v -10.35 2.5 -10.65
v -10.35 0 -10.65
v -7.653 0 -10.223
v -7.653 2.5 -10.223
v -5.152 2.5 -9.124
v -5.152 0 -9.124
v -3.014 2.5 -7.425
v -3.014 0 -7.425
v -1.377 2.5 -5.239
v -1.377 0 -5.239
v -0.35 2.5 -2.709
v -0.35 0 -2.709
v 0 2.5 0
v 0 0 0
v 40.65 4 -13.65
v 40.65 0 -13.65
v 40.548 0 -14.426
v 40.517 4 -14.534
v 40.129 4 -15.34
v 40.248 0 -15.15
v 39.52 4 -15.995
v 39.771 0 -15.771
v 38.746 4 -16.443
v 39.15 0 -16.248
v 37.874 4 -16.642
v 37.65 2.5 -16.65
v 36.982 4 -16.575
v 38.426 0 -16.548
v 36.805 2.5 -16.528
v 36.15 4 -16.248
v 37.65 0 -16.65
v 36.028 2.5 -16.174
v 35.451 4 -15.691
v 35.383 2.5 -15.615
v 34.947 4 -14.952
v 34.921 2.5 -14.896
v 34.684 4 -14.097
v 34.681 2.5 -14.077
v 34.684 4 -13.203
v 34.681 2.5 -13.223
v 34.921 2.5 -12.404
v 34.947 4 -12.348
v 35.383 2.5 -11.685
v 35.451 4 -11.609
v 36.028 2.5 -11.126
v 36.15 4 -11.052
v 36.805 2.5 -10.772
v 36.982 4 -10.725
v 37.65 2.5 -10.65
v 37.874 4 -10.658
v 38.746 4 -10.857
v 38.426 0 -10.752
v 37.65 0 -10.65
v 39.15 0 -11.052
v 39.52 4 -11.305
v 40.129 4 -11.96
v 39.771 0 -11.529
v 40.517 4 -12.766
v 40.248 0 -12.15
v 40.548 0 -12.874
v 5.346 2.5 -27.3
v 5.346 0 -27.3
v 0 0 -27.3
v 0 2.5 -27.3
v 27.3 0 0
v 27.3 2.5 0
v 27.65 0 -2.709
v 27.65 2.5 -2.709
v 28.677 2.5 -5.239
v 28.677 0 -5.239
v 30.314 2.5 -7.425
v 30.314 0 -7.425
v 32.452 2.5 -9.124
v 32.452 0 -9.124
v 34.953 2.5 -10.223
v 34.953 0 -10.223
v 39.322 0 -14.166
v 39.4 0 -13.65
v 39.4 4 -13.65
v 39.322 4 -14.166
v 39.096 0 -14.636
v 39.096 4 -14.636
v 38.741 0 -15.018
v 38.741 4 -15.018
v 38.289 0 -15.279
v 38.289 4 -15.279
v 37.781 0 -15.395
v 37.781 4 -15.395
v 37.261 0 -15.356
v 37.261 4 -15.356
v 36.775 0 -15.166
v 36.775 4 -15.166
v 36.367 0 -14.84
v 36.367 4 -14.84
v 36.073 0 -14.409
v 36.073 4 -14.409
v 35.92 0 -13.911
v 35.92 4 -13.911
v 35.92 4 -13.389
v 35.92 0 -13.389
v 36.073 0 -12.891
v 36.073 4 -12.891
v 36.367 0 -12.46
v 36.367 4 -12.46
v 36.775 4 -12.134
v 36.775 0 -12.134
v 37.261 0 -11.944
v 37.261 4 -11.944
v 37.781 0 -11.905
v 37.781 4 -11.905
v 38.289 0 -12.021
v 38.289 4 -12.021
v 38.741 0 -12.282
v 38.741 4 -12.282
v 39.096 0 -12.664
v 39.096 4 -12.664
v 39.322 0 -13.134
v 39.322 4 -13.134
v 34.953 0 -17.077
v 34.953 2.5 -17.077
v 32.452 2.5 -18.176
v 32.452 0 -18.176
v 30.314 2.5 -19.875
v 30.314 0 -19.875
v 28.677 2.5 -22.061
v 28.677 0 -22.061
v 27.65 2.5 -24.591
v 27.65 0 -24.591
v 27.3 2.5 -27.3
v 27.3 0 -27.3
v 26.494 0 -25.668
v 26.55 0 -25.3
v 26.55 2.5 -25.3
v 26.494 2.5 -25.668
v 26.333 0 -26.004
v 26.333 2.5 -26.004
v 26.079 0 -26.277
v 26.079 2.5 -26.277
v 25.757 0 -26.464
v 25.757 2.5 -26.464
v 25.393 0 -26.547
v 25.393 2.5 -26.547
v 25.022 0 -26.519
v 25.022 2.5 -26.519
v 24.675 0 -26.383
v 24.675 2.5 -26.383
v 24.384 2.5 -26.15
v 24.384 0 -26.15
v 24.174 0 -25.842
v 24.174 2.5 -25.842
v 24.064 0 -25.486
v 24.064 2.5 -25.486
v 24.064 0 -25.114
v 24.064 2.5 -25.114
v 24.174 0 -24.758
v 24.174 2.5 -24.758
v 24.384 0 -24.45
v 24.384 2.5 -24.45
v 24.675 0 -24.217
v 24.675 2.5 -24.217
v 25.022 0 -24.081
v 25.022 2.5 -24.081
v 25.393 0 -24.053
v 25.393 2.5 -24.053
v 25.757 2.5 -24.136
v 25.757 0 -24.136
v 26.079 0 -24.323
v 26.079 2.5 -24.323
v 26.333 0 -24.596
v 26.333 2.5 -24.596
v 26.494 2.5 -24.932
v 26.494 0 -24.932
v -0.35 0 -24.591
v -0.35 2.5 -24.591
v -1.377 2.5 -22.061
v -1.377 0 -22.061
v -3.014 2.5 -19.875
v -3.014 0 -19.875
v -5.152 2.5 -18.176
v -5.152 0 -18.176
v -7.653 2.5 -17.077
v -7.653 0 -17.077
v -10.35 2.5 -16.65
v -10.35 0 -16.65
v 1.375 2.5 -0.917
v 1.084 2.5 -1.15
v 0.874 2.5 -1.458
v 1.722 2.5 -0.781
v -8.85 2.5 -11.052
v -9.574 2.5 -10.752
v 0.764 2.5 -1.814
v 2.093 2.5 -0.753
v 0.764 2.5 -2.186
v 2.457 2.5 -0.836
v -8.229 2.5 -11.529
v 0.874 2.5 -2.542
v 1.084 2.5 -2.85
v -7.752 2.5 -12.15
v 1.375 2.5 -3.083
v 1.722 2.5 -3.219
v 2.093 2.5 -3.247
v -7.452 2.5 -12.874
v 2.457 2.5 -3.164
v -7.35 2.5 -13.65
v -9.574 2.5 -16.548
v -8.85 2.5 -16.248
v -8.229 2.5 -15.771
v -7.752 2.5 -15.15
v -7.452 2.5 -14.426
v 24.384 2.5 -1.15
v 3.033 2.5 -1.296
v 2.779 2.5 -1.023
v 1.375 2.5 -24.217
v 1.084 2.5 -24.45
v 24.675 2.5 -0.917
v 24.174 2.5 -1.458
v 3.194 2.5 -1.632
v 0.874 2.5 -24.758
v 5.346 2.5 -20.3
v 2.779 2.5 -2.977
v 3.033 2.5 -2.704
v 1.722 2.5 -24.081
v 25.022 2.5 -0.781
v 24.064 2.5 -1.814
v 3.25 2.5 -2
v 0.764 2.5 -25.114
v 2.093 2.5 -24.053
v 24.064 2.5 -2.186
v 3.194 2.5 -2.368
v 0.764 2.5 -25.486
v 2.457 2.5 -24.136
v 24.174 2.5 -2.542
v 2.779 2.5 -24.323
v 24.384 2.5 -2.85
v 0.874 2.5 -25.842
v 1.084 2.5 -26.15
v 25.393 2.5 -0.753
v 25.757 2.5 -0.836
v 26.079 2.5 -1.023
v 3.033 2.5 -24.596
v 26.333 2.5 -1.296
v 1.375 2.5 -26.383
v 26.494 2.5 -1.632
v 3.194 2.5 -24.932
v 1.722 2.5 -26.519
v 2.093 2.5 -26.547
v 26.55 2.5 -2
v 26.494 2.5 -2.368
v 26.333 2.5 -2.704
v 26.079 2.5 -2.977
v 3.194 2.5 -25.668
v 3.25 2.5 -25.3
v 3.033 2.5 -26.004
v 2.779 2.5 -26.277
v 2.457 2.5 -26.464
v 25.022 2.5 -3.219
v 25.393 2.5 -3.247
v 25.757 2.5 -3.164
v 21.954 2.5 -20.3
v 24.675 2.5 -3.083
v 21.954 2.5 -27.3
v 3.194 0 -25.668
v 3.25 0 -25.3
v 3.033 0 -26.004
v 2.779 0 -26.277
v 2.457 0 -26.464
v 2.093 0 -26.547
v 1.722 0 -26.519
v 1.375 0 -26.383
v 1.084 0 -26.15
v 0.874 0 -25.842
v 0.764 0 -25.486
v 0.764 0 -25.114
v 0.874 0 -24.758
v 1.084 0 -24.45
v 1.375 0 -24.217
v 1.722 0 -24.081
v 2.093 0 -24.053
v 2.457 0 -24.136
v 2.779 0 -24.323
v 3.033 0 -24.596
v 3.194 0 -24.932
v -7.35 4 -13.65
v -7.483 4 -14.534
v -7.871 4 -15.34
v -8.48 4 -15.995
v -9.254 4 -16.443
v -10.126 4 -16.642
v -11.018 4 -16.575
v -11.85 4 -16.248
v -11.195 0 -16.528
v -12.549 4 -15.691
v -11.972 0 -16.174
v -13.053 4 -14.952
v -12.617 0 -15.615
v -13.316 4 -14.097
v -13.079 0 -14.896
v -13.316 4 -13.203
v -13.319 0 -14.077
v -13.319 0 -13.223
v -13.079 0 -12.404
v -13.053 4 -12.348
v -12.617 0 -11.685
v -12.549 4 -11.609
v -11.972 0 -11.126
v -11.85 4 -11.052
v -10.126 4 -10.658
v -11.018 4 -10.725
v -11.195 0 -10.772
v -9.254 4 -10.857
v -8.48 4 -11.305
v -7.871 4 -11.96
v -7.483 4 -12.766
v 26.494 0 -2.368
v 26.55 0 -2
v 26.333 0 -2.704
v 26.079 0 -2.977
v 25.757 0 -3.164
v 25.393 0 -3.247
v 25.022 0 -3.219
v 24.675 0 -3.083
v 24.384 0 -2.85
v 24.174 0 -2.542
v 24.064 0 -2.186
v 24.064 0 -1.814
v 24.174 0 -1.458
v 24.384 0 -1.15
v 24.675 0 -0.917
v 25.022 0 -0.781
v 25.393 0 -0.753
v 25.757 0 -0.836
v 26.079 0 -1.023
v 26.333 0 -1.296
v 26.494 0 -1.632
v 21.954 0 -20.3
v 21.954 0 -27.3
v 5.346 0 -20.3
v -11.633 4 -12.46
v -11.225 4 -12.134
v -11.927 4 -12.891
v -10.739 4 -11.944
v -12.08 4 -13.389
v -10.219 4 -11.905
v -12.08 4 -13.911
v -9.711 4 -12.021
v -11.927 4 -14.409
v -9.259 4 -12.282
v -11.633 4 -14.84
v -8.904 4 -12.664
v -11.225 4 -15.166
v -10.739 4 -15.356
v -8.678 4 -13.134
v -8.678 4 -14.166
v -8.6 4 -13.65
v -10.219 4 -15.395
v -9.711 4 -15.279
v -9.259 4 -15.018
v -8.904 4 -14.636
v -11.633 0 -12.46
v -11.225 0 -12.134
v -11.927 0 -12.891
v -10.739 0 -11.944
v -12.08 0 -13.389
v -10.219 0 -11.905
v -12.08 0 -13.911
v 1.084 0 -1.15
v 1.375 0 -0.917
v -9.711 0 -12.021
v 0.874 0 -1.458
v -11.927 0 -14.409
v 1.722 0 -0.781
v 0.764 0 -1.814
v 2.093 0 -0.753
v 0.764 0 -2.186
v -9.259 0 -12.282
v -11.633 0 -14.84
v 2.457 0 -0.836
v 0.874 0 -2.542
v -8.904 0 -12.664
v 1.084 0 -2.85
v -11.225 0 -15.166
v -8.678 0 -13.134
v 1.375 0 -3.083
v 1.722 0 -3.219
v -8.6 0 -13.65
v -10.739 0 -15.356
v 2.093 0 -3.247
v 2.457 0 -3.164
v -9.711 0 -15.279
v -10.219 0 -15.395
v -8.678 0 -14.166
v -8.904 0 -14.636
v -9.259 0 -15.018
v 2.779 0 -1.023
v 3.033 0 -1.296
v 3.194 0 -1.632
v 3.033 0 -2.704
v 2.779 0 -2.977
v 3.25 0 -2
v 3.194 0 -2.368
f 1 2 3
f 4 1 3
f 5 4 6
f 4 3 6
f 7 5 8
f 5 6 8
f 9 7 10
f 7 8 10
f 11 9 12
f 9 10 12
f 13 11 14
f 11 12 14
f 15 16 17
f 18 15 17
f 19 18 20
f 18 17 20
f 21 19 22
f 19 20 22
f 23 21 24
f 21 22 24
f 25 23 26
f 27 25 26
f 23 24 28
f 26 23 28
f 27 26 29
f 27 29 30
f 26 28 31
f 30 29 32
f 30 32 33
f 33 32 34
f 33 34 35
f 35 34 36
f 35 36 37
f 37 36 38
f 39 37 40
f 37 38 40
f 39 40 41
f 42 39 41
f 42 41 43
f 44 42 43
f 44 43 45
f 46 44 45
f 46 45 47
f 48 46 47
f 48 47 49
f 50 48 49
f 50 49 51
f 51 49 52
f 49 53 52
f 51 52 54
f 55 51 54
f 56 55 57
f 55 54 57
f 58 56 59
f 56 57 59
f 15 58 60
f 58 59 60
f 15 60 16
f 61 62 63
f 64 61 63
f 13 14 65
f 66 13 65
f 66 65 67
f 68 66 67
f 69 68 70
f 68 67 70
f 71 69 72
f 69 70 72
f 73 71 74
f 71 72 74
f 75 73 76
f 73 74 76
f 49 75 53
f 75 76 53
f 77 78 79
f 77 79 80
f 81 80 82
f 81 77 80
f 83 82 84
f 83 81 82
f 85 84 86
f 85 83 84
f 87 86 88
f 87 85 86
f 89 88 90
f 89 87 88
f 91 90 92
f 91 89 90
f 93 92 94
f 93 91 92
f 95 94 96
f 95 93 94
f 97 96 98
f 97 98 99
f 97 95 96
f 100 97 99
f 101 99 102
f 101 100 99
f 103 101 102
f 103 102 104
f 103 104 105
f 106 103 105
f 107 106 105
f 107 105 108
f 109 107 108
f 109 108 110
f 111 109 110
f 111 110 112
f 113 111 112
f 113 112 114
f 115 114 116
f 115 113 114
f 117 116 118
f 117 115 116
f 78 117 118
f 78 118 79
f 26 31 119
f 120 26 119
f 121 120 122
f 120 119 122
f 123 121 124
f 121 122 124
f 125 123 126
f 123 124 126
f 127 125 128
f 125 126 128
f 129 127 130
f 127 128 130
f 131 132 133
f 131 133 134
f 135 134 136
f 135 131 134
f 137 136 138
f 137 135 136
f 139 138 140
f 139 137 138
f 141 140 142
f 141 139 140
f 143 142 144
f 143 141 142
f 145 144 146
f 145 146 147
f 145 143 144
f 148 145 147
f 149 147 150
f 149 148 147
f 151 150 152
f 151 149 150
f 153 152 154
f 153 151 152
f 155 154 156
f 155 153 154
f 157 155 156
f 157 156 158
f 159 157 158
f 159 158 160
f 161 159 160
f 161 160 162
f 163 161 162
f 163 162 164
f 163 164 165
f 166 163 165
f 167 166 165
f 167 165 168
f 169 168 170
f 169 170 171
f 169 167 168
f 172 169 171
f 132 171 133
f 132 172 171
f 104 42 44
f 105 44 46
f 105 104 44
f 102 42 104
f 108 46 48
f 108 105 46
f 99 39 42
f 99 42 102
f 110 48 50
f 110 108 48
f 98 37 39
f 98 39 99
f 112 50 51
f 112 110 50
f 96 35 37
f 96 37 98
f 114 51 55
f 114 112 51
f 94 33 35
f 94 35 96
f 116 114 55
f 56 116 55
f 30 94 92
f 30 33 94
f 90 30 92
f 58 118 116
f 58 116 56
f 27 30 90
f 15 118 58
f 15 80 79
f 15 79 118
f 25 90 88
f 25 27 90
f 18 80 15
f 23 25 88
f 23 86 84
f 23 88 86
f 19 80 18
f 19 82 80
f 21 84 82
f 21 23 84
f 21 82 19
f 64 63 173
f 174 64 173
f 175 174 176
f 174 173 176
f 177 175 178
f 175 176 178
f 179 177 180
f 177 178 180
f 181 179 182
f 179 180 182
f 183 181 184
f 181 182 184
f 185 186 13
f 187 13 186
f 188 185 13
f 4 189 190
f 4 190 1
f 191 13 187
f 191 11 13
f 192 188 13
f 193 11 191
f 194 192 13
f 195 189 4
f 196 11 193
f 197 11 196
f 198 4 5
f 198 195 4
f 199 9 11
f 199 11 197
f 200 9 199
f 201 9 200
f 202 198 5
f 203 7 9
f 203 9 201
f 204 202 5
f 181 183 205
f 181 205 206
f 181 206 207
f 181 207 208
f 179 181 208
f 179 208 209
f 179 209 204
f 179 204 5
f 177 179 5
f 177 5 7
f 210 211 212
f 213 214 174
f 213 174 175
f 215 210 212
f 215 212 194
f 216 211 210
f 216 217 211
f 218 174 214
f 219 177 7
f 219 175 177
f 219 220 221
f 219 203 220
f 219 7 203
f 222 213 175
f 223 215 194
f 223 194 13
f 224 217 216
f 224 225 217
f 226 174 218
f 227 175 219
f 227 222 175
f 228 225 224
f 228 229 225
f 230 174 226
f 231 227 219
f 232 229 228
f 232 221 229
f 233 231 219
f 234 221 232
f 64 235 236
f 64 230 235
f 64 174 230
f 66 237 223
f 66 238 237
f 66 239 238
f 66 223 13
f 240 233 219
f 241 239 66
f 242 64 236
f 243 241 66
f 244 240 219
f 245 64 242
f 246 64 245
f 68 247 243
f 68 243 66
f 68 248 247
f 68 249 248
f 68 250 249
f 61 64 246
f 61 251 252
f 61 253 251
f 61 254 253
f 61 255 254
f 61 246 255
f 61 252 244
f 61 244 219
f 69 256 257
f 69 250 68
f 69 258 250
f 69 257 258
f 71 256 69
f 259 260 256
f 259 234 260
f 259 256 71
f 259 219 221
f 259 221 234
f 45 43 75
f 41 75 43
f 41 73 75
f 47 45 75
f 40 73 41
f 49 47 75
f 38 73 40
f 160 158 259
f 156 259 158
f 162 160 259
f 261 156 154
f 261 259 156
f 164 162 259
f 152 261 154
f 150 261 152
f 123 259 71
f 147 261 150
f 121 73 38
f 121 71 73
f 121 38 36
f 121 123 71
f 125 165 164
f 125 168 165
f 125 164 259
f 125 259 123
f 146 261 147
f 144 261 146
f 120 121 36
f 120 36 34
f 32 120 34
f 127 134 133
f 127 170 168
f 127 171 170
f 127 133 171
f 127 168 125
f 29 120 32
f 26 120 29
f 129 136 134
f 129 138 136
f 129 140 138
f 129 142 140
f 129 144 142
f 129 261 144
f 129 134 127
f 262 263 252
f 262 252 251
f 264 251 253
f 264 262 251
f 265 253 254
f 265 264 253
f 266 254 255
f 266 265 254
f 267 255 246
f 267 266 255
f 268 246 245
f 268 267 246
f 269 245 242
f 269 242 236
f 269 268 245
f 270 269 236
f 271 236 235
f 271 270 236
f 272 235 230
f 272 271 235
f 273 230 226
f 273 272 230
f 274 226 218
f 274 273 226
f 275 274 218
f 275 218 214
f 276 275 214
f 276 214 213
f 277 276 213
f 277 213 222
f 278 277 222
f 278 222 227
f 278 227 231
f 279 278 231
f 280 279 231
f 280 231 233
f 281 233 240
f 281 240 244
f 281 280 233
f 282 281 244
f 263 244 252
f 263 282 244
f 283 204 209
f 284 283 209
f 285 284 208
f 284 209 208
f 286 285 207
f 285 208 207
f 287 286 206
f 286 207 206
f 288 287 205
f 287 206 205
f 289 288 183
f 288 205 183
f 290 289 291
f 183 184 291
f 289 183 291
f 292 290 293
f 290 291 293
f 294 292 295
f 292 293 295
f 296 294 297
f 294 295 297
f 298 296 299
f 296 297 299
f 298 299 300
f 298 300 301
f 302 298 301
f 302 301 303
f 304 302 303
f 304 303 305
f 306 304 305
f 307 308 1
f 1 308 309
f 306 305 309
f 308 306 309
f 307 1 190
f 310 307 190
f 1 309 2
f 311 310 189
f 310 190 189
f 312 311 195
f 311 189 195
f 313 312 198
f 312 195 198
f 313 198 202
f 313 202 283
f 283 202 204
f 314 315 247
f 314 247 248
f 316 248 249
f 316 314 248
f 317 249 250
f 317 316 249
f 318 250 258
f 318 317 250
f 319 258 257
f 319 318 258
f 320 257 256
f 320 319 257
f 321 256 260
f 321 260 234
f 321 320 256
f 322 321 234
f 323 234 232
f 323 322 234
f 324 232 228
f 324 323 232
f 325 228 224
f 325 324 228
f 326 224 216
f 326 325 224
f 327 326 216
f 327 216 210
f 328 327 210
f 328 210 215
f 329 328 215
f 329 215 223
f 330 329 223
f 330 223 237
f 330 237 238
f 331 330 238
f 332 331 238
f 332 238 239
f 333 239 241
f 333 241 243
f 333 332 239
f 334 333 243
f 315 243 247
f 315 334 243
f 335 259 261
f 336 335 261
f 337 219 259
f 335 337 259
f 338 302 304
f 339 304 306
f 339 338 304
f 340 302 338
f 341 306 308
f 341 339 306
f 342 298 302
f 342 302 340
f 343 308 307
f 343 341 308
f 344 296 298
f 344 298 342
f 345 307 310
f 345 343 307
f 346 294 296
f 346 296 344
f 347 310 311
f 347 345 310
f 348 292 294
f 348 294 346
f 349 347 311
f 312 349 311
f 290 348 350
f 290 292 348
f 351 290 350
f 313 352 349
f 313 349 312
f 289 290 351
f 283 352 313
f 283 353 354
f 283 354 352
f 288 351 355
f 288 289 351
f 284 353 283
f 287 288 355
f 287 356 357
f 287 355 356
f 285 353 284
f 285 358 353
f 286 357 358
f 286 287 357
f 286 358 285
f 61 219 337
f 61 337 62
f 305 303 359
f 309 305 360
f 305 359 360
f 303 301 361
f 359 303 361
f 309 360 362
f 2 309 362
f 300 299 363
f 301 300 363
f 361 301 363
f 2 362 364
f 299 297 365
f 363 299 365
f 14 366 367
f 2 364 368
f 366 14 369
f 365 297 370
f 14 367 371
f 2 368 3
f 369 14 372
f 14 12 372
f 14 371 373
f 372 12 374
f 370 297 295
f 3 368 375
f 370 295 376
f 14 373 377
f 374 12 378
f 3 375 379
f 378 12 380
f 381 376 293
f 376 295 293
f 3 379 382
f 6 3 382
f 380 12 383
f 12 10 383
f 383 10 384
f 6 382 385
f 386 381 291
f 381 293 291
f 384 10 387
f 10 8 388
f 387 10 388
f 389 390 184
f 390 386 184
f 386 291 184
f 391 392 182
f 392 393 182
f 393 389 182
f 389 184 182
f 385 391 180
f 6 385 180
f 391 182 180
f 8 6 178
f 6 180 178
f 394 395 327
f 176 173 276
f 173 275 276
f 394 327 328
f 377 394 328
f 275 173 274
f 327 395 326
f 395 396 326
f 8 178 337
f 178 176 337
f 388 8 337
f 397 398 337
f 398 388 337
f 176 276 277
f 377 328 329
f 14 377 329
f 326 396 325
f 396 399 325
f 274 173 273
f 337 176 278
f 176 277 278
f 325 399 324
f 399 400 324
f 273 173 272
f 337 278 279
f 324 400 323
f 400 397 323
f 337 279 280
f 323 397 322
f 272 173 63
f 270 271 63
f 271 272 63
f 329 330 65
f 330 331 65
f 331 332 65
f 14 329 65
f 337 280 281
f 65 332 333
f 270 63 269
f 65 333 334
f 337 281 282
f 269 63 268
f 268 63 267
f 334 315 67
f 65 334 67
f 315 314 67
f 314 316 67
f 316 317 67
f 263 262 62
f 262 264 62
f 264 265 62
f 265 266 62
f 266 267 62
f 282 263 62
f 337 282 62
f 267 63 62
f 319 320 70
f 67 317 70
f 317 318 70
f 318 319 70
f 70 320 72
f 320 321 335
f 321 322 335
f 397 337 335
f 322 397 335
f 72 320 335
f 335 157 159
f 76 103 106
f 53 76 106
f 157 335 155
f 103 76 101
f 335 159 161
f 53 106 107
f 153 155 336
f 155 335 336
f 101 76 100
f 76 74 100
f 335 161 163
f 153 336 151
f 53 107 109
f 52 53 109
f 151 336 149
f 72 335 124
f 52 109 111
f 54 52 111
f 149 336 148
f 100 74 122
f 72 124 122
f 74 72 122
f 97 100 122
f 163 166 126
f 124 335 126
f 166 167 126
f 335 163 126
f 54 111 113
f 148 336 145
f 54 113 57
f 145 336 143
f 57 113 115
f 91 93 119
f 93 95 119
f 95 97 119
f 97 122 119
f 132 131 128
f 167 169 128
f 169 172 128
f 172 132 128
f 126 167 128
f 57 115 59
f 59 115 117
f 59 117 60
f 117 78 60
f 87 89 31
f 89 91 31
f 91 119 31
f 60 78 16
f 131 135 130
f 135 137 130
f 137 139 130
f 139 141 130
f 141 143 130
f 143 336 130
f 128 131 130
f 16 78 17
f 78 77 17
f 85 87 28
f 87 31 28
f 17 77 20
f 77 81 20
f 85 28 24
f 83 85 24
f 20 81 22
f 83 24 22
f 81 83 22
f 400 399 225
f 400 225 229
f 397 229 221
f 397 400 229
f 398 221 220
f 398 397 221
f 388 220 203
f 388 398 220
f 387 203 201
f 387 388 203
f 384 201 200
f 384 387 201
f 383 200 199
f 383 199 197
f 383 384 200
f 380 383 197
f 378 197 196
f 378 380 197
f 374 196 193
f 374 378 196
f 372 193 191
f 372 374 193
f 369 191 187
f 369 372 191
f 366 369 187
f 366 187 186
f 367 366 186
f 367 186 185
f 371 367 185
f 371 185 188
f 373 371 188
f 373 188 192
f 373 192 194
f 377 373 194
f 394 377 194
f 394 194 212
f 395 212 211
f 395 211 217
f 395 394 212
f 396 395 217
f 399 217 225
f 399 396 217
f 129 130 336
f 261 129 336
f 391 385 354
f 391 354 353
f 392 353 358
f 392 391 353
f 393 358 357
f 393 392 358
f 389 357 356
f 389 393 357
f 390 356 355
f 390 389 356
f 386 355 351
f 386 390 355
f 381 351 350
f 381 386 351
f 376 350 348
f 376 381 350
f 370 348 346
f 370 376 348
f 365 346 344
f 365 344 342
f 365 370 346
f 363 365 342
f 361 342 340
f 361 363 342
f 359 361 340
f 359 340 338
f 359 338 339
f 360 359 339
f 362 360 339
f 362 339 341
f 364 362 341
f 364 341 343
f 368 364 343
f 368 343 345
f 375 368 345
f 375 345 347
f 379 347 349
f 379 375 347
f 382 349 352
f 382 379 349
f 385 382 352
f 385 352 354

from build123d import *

# Parameters (mm, degrees)
SKETCH2_R           = 1.25
BOSS_EXTRUDE1_DEPTH = 2.5
SKETCH2_4_R         = 3
SKETCH2_4_R_2       = 1.75
BOSS_EXTRUDE2_DEPTH = 4
SKETCH3_W           = 16.608695652
SKETCH3_H           = 7
CUT_EXTRUDE1_DEPTH  = 3.25


with BuildPart() as part:
    # Sketch2 → Boss-Extrude1 (new body)
    with BuildSketch(Plane(origin=(0, 0, 0), x_dir=(1, 0, 0), z_dir=(0, 1, 0))):
        with BuildLine():
            Line((27.3, 27.3), (0, 27.3))
            ThreePointArc((0, 27.3), (-3.013740677, 19.874621222), (-10.35, 16.65))
            ThreePointArc((-10.35, 16.65), (-7.35, 13.65), (-10.35, 10.65))
            ThreePointArc((-10.35, 10.65), (-3.013740677, 7.425378778), (0, 0))
            Line((0, 0), (27.3, 0))
            ThreePointArc((27.3, 0), (30.313740677, 7.425378778), (37.65, 10.65))
            ThreePointArc((37.65, 10.65), (34.65, 13.65), (37.65, 16.65))
            ThreePointArc((37.65, 16.65), (30.313740677, 19.874621222), (27.3, 27.3))
        make_face()
        with Locations((2, 25.3)):
            Circle(SKETCH2_R, mode=Mode.SUBTRACT)
        with Locations((2, 2)):
            Circle(SKETCH2_R, mode=Mode.SUBTRACT)
        with Locations((25.3, 2)):
            Circle(SKETCH2_R, mode=Mode.SUBTRACT)
        with Locations((25.3, 25.3)):
            Circle(SKETCH2_R, mode=Mode.SUBTRACT)
    extrude(amount=BOSS_EXTRUDE1_DEPTH)

    # Sketch2<4> → Boss-Extrude2 (add)
    # profile 1 of 2: a face of its own
    with BuildSketch(Plane(origin=(0, 0, 0), x_dir=(1, 0, 0), z_dir=(0, 1, 0))):
        with Locations((-10.35, 13.65)):
            Circle(SKETCH2_4_R)
        with Locations((-10.35, 13.65)):
            Circle(SKETCH2_4_R_2, mode=Mode.SUBTRACT)
    # profile 2 of 2: a face of its own
    with BuildSketch(Plane(origin=(0, 0, 0), x_dir=(1, 0, 0), z_dir=(0, 1, 0))):
        with Locations((37.65, 13.65)):
            Circle(SKETCH2_4_R)
        with Locations((37.65, 13.65)):
            Circle(SKETCH2_4_R_2, mode=Mode.SUBTRACT)
    extrude(amount=BOSS_EXTRUDE2_DEPTH)

    # Sketch3 → Cut-Extrude1 (cut)
    with BuildSketch(Plane(origin=(0, 2.5, 0), x_dir=(1, 0, 0), z_dir=(0, 1, 0))):
        with Locations((13.65, 23.8)):
            Rectangle(SKETCH3_W, SKETCH3_H)
    extrude(amount=-CUT_EXTRUDE1_DEPTH, mode=Mode.SUBTRACT)


solid = part.part
